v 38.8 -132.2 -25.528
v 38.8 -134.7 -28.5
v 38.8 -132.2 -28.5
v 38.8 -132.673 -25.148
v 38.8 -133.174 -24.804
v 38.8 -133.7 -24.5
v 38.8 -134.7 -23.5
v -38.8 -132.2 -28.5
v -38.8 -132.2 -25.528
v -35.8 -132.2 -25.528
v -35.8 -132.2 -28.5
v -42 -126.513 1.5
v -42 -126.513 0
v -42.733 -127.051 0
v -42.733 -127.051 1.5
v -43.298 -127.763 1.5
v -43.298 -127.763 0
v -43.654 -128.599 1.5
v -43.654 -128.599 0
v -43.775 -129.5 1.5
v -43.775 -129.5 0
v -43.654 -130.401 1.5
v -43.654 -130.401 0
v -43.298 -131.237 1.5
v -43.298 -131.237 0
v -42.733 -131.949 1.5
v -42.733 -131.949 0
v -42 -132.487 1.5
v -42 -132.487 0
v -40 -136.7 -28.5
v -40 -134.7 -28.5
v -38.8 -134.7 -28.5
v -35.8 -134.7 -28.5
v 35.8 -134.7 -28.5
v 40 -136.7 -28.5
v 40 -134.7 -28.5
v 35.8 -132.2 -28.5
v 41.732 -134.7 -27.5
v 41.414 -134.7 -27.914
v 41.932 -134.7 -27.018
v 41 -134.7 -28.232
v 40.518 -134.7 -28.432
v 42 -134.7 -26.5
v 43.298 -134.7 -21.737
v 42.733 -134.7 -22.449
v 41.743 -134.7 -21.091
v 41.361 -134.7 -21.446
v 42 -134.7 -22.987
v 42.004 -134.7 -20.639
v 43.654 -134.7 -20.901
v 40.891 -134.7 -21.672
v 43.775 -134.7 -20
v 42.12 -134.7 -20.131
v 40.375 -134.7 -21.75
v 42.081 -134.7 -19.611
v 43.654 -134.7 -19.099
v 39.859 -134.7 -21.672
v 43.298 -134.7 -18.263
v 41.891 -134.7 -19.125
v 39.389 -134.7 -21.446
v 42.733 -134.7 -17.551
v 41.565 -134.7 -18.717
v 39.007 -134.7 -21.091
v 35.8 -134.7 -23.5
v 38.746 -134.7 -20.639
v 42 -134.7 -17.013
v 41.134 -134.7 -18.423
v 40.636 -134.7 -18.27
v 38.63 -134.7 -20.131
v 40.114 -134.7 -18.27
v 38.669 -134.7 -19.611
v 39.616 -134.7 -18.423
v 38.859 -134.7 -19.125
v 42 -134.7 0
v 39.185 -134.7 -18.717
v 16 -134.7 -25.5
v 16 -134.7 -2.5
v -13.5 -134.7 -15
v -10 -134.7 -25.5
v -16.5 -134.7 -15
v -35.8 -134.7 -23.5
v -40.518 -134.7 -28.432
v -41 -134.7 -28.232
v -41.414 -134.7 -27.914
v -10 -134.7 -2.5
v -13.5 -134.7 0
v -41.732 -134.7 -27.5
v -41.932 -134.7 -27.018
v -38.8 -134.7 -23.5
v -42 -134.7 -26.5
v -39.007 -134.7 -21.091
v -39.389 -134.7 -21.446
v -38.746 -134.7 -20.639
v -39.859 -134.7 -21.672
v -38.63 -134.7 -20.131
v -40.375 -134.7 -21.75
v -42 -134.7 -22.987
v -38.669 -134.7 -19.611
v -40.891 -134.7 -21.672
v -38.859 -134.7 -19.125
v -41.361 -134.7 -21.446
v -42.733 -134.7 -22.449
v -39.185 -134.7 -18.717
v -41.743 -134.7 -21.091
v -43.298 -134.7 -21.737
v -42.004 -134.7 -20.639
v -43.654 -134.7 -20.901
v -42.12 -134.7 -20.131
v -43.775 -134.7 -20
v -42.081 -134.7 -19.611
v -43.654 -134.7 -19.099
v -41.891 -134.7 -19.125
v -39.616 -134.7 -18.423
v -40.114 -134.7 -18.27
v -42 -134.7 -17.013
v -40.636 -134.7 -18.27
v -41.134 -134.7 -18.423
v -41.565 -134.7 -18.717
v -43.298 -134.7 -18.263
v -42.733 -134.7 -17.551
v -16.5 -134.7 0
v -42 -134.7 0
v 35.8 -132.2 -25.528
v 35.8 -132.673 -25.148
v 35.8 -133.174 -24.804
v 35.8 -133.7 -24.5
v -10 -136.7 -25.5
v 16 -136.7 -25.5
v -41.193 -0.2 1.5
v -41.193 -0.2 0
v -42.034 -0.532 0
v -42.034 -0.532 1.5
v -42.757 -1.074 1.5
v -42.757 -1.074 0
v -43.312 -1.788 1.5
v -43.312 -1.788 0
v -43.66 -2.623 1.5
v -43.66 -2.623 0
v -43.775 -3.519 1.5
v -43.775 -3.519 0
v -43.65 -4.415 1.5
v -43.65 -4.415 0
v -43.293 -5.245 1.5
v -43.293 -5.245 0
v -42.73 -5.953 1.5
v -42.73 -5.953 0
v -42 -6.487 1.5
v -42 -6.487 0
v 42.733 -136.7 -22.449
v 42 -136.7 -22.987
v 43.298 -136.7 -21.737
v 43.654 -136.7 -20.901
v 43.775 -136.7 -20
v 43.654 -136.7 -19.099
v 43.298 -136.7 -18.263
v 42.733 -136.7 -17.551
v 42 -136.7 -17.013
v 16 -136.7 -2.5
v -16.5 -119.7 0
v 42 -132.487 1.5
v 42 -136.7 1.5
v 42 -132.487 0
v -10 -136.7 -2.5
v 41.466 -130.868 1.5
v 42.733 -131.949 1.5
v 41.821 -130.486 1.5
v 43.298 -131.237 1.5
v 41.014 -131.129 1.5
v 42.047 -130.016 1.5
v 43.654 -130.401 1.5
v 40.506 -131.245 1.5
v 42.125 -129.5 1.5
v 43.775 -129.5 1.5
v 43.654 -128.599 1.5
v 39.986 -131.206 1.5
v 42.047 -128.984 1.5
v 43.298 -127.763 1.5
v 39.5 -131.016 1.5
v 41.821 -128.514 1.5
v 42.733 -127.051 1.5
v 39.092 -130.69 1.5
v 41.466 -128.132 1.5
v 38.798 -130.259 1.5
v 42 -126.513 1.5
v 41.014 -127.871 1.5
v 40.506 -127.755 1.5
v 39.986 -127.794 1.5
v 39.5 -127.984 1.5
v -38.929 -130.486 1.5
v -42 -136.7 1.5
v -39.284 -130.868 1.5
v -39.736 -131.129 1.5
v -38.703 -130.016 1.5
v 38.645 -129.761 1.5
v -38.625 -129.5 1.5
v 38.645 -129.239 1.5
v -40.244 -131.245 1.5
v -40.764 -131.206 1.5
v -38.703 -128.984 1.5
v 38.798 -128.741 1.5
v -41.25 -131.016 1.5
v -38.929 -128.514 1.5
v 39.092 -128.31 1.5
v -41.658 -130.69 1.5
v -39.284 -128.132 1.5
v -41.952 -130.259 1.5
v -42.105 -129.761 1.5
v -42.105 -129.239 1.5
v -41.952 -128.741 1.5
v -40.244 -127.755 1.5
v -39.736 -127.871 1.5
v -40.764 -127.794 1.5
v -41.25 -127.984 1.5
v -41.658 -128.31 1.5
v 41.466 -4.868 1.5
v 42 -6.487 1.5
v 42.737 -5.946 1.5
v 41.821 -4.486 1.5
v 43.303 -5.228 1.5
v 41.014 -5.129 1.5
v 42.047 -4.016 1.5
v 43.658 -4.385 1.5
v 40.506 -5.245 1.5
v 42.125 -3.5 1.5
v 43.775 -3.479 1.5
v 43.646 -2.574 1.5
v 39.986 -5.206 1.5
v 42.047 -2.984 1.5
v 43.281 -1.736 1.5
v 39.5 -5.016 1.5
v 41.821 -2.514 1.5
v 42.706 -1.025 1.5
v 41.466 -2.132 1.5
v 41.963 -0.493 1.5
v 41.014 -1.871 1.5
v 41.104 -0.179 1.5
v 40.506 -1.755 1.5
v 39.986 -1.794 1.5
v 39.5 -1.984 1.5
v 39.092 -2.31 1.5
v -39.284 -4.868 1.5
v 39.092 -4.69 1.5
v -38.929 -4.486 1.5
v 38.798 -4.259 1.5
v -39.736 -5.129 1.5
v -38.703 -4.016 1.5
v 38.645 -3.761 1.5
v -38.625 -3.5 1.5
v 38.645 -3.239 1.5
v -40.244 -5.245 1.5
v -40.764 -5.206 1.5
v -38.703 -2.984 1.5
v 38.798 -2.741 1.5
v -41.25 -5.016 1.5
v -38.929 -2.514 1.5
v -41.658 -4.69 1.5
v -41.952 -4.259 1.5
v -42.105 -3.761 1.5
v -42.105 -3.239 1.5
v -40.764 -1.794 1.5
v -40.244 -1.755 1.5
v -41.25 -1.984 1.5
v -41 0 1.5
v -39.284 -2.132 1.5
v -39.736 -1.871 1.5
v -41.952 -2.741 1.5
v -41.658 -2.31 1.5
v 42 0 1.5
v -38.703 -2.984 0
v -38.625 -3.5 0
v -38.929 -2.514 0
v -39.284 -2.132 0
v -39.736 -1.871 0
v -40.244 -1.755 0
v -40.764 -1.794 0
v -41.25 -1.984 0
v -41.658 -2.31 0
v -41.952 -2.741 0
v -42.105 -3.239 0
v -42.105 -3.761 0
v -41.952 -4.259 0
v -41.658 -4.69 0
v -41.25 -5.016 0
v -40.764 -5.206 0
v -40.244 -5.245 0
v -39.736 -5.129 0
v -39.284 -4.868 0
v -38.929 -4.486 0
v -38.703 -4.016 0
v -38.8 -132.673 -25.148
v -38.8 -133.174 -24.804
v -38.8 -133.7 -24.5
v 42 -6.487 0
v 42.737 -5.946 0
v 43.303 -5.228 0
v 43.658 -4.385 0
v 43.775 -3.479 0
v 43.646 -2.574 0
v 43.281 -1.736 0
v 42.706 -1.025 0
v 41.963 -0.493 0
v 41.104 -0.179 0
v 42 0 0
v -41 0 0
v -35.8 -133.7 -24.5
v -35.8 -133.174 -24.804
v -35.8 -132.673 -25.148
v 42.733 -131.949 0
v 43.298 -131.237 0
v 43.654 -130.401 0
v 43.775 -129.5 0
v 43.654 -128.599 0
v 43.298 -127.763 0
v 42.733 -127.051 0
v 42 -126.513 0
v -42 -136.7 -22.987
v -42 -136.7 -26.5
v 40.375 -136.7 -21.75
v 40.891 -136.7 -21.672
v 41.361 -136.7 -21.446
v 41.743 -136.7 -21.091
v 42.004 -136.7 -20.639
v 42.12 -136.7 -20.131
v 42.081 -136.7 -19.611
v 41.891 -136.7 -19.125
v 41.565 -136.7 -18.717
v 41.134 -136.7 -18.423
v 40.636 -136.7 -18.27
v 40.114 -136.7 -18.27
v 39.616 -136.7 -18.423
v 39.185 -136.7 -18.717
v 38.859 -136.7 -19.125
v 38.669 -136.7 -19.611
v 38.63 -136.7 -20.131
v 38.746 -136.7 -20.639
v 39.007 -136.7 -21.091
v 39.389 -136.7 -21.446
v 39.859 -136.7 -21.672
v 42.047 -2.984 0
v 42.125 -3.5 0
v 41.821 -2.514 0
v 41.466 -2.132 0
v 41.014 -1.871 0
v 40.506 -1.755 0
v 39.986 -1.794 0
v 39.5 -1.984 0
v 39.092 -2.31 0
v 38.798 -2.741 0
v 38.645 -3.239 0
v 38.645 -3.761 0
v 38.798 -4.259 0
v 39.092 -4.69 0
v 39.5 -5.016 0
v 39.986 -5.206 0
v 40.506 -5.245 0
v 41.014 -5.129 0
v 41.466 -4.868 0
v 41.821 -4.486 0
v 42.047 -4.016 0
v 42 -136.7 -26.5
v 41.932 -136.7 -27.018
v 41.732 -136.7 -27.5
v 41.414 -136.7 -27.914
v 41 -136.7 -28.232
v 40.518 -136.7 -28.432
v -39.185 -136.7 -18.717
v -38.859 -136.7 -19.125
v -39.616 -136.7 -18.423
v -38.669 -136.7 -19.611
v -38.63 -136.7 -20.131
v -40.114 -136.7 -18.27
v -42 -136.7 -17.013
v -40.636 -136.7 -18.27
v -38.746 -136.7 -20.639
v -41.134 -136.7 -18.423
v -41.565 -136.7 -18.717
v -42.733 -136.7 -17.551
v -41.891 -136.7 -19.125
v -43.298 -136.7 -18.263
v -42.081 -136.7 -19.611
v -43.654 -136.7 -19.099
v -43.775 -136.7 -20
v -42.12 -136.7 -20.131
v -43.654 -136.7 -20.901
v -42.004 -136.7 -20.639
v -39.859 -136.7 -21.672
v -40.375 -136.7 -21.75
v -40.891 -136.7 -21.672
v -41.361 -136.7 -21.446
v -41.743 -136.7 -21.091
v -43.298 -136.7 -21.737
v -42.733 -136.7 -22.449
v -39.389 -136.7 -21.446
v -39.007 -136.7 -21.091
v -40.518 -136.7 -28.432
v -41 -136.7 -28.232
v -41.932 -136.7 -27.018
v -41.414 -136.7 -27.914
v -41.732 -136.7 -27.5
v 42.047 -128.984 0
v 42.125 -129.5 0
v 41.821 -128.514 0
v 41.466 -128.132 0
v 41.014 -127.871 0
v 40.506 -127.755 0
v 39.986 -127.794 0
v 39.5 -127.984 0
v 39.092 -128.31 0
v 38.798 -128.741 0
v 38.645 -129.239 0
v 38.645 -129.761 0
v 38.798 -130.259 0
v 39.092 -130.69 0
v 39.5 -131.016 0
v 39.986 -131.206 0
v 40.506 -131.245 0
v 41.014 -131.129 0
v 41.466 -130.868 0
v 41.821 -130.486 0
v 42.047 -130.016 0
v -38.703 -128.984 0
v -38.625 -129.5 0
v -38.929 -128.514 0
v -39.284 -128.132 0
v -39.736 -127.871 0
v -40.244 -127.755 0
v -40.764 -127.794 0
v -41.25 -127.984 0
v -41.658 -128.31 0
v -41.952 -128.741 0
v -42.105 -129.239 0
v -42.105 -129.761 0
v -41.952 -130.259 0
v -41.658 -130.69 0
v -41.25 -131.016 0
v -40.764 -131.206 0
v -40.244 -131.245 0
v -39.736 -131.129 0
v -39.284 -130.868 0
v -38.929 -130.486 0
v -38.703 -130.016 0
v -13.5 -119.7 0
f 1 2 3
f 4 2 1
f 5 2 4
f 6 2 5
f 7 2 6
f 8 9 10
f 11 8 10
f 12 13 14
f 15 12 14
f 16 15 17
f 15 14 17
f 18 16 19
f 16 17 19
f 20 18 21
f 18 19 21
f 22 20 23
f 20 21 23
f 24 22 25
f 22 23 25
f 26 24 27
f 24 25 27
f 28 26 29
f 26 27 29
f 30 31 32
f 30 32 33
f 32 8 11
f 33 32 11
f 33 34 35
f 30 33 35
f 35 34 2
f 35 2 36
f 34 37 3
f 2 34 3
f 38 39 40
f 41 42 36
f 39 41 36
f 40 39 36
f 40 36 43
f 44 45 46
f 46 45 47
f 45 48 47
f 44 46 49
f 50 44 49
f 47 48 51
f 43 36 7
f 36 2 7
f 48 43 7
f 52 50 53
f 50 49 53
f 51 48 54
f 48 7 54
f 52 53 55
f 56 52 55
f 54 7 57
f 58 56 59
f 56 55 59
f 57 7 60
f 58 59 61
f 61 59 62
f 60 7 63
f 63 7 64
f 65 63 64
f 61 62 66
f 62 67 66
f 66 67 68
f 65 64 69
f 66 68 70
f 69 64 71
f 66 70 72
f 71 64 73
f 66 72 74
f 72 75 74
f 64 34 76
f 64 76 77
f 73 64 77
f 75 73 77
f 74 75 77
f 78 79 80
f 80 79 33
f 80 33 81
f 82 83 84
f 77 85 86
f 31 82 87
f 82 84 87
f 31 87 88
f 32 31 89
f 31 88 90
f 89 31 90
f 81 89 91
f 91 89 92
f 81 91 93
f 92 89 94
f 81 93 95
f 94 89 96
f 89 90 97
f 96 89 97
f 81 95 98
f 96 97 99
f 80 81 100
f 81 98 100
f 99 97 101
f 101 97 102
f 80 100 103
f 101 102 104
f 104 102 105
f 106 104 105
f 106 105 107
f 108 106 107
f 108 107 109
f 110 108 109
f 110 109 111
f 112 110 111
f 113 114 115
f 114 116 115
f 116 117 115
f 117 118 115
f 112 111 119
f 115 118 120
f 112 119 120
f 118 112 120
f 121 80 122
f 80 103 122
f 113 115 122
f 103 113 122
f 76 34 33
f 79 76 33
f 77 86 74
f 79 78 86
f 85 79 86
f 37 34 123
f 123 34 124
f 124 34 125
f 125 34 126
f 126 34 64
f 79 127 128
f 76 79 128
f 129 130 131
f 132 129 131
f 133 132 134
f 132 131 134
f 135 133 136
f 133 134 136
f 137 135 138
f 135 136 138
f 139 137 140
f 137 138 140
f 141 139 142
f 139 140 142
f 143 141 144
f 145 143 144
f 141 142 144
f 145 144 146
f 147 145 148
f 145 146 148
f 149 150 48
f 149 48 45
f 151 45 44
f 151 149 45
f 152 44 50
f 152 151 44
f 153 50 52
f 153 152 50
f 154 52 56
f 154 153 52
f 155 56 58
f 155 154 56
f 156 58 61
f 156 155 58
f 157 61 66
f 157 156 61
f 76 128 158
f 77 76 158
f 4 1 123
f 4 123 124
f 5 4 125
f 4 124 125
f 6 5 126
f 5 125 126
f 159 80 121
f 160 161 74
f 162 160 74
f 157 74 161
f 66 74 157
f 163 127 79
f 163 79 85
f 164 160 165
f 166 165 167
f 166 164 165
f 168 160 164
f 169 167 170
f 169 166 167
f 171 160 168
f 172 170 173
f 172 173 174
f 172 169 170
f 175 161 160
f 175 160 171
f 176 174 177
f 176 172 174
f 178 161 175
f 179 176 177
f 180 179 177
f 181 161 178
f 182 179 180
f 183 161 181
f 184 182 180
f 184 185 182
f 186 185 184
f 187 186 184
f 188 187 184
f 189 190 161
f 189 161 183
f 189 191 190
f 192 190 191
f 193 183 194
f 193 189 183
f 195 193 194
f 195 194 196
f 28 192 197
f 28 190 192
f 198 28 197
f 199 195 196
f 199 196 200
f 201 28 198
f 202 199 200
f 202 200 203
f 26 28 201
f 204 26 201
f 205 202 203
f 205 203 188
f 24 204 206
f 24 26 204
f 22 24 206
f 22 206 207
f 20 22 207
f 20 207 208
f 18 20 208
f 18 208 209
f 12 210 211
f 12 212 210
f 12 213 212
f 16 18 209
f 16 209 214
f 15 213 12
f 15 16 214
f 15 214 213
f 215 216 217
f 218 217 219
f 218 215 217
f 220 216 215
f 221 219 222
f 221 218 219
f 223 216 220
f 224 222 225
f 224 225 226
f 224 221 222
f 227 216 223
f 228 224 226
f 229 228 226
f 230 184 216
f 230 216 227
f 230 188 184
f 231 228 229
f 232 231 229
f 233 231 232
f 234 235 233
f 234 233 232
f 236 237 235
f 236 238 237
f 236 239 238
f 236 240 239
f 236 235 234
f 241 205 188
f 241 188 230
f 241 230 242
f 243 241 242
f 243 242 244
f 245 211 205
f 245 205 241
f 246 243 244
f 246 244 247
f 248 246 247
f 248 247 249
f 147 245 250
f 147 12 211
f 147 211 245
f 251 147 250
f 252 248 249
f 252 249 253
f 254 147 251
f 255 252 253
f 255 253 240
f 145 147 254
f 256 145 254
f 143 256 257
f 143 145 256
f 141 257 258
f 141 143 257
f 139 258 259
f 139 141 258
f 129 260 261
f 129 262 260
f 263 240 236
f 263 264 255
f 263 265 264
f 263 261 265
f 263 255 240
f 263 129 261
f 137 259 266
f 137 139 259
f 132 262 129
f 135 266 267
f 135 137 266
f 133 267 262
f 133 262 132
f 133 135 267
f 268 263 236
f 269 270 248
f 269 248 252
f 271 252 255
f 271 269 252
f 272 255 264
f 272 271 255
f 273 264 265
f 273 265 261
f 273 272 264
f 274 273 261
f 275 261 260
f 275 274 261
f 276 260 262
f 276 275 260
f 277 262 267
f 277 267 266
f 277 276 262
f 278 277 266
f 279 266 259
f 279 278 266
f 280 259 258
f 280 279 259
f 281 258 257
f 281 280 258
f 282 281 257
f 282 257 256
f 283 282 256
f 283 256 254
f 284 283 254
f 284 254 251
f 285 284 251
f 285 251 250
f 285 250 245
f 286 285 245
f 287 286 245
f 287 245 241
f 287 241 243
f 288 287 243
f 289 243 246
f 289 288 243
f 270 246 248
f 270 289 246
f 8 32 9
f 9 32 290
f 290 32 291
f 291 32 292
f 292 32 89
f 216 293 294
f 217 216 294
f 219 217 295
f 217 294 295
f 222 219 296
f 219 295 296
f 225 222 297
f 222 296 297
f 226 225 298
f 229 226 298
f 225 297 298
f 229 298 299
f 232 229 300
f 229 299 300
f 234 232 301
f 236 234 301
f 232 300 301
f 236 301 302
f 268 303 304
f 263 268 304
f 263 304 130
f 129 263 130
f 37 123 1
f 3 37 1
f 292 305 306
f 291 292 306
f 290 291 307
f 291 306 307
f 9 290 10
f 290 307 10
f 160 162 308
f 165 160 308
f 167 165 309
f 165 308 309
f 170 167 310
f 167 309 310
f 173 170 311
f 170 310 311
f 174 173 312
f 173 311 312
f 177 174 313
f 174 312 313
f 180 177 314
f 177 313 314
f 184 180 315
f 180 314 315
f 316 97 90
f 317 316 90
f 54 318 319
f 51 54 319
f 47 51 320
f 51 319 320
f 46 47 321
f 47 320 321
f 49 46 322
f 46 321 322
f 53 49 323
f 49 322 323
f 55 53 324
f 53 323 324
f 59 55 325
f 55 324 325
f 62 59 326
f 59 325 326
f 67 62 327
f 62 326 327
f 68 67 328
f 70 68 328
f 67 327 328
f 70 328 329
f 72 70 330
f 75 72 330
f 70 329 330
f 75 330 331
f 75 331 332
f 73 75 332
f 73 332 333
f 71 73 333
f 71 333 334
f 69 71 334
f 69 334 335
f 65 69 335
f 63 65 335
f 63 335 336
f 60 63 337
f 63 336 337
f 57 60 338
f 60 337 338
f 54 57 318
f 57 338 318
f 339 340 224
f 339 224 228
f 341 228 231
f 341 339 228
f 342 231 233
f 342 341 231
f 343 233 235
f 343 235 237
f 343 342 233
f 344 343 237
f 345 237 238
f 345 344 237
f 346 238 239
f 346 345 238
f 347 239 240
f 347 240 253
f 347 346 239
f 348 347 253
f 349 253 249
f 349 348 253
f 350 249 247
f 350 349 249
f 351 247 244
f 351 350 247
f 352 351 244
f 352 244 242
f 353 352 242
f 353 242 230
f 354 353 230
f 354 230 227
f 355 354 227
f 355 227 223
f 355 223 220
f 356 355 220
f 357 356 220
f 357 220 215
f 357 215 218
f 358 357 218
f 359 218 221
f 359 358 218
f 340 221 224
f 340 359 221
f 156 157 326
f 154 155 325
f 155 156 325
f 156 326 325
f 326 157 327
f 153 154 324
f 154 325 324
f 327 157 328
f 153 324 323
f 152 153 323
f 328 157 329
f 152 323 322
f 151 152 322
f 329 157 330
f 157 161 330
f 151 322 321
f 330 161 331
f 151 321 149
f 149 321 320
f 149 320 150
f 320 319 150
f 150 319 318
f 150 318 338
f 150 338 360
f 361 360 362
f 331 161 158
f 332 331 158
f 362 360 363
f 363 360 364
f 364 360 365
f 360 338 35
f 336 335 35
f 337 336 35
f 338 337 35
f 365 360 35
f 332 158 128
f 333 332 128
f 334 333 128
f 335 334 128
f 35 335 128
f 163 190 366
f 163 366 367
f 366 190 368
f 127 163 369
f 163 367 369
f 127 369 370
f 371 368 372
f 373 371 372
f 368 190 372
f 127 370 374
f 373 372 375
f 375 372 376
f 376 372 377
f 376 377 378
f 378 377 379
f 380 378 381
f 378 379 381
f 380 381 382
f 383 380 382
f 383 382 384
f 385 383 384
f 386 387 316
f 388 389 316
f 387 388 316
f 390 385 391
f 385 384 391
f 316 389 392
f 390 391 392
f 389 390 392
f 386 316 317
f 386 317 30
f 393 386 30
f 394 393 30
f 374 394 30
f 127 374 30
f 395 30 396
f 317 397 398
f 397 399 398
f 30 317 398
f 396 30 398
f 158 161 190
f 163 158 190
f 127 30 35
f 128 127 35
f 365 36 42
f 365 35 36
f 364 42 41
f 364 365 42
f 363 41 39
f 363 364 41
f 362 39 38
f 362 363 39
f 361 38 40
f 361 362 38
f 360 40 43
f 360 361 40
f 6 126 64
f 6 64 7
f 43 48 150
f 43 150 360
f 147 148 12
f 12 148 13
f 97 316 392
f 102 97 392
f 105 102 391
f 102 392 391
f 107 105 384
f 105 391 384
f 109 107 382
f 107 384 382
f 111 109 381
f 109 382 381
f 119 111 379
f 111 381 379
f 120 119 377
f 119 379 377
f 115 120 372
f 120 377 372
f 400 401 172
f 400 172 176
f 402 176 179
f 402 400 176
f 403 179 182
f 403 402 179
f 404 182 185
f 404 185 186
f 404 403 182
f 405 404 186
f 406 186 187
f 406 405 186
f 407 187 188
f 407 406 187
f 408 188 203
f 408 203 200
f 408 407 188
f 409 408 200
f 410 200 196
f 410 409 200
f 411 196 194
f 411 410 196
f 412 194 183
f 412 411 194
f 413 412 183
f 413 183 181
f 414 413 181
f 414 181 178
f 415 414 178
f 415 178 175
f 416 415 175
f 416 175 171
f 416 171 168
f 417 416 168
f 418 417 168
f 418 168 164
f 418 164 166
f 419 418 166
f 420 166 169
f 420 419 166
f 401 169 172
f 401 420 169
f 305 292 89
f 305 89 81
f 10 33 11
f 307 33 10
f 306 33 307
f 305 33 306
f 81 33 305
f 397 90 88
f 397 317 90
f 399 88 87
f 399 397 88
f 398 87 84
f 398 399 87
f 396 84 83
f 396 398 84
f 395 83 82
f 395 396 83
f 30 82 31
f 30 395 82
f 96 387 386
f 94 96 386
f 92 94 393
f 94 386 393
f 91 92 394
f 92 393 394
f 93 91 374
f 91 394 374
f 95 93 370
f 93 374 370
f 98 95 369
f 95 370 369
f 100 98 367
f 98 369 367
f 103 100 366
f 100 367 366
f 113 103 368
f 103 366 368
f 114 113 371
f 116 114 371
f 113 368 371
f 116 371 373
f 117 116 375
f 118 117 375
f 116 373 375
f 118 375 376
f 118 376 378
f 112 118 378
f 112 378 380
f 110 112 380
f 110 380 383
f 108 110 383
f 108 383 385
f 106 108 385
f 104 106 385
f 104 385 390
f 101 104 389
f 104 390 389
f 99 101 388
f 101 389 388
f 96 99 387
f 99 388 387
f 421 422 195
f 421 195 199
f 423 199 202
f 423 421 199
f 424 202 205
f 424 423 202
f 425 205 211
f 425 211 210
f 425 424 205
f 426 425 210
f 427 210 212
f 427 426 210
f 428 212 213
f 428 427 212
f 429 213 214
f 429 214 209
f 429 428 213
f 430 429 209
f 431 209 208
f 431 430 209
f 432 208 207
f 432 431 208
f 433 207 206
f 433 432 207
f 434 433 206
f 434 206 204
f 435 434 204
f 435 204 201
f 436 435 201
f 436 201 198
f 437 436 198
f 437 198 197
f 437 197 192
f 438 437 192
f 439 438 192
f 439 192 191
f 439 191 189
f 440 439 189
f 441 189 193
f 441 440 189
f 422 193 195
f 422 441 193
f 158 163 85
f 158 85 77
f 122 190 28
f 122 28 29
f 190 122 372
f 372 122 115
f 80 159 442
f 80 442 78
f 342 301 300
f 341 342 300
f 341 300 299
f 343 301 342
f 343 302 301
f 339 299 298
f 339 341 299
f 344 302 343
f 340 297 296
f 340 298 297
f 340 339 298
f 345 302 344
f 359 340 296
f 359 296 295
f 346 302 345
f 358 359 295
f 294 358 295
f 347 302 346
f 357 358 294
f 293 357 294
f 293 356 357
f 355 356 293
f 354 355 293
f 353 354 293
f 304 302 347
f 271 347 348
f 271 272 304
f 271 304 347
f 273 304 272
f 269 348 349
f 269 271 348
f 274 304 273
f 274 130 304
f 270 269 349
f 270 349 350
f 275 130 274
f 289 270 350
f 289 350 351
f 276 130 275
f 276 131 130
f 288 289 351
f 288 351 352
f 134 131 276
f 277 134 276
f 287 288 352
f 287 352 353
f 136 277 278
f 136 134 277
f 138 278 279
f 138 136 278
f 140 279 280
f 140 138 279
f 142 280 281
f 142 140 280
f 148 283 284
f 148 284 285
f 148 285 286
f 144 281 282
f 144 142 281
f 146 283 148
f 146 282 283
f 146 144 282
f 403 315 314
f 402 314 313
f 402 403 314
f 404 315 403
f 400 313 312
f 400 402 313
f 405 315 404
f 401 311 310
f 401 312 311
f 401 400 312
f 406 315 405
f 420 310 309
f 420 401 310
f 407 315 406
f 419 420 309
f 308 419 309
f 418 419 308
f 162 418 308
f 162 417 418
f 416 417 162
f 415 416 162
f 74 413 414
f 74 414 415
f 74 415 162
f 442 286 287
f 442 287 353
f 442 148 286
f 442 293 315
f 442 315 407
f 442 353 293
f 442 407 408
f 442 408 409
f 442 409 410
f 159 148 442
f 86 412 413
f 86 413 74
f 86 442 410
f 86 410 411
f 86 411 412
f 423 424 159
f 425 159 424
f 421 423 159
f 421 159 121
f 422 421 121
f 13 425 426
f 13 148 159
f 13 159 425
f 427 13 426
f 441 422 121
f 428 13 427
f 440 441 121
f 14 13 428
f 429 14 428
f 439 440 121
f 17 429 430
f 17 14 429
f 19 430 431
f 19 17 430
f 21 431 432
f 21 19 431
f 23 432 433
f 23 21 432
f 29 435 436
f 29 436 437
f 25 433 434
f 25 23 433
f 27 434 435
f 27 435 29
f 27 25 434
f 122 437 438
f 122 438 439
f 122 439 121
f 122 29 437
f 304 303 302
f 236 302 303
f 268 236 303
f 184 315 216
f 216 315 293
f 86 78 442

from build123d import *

# Parameters (mm, degrees)
SKETCH1_R                = 1.75
BOSS_EXTRUDE1_DEPTH      = 1.5
BOSS_EXTRUDE2_DEPTH      = 84
BOSS_EXTRUDE3_DEPTH      = 1.5
BOSS_EXTRUDE3_DEPTH_BACK = 1.5
BOSS_EXTRUDE4_DEPTH      = 2
SKETCH5_R                = 1.75
CUT_EXTRUDE1_DEPTH       = 2
CUT_EXTRUDE2_DEPTH       = 150.007183132
CUT_EXTRUDE2_DEPTH_BACK  = 150.007183132
SKETCH6_W                = 84
SKETCH6_H                = 11.5
BOSS_EXTRUDE6_START      = -2
SKETCH7_W                = 3
SKETCH7_H                = 4
BOSS_EXTRUDE6_DEPTH      = 2.5
FILLET1_R                = 2
CHAMFER1_SIZE            = 1
FILLET2_R                = 8
SKETCH8_W                = 26
SKETCH8_H                = 23
CUT_EXTRUDE3_DEPTH       = 22.4262221


with BuildPart() as part:
    # Sketch1 → Boss-Extrude1 (new body)
    with BuildSketch(Plane.XY):
        with BuildLine():
            Line((-38.75, -134.5), (38.75, -134.5))
            Line((38.75, -134.5), (42, -134.5))
            Line((42, -134.5), (42, -132.48653227))
            ThreePointArc((42, -132.48653227), (43.775, -129.5), (42, -126.51346773))
            Line((42, -126.51346773), (42, -6.48653227))
            ThreePointArc((42, -6.48653227), (43.741212037, -3.021861398), (41.104087703, -0.179091823))
            Line((41.104087703, -0.179091823), (42, 0))
            Line((42, 0), (-41, 0))
            Line((-41, 0), (-41.193033114, -0.199875483))
            ThreePointArc((-41.193033114, -0.199875483), (-43.747330957, -3.067121364), (-42, -6.48653227))
            Line((-42, -6.48653227), (-42, -126.51346773))
            ThreePointArc((-42, -126.51346773), (-43.775, -129.5), (-42, -132.48653227))
            Line((-42, -132.48653227), (-42, -134.5))
            Line((-42, -134.5), (-38.75, -134.5))
        make_face()
        with Locations((-40.375, -129.5)):
            Circle(SKETCH1_R, mode=Mode.SUBTRACT)
        with Locations((40.375, -129.5)):
            Circle(SKETCH1_R, mode=Mode.SUBTRACT)
        with Locations((40.375, -3.5)):
            Circle(SKETCH1_R, mode=Mode.SUBTRACT)
        with Locations((-40.375, -3.5)):
            Circle(SKETCH1_R, mode=Mode.SUBTRACT)
    extrude(amount=BOSS_EXTRUDE1_DEPTH)

    # Sketch2 → Boss-Extrude2 (add)
    with BuildSketch(Plane.ZY.offset(42)):
        Polygon((1.5, -134.5), (1.5, -136.7), (-40, -136.7), (-40, -134.7), (0, -134.7), (0, -134.5), (0, -132.48653227), (1.5, -132.48653227), align=None)
    extrude(amount=-BOSS_EXTRUDE2_DEPTH)

    # Sketch3 → Boss-Extrude3 (add, two sides: drawn at the far end of the back side and taken through both)
    with BuildSketch(Plane(origin=(-15, 0, 0), x_dir=(0, 0, -1), z_dir=(1, 0, 0)).offset(-BOSS_EXTRUDE3_DEPTH_BACK)):
        Polygon((0, -119.7), (15, -134.7), (0, -134.7), align=None)
    extrude(amount=BOSS_EXTRUDE3_DEPTH + BOSS_EXTRUDE3_DEPTH_BACK)

    # Sketch4 → Boss-Extrude4 (add)
    with BuildSketch(Plane.XZ.offset(136.7)):
        with BuildLine():
            Line((-42, -17.01346773), (-42, -22.98653227))
            ThreePointArc((-42, -22.98653227), (-43.775, -20), (-42, -17.01346773))
        make_face()
        with BuildLine():
            Line((42, -17.01346773), (42, -22.98653227))
            ThreePointArc((42, -22.98653227), (43.775, -20), (42, -17.01346773))
        make_face()
    extrude(amount=-BOSS_EXTRUDE4_DEPTH)

    # Sketch5 → Cut-Extrude1 (cut)
    with BuildSketch(Plane.XZ.offset(136.7)):
        with Locations(Location((40.375, -20, 0), (0, 0, 270))):
            Circle(SKETCH5_R)
        with Locations(Location((-40.375, -20, 0), (0, 0, 270))):
            Circle(SKETCH5_R)
    extrude(amount=-CUT_EXTRUDE1_DEPTH, mode=Mode.SUBTRACT)

    # Sketch6 → Cut-Extrude2 (cut, two sides: drawn at the far end of the back side and taken through both)
    with BuildSketch(Plane.XZ.offset(136.7).offset(-CUT_EXTRUDE2_DEPTH_BACK)):
        with Locations((0, -34.25)):
            Rectangle(SKETCH6_W, SKETCH6_H)
    extrude(amount=CUT_EXTRUDE2_DEPTH + CUT_EXTRUDE2_DEPTH_BACK, mode=Mode.SUBTRACT)

    # Sketch7 → Boss-Extrude6 (add)
    with BuildSketch(Plane.XZ.offset(136.7).offset(BOSS_EXTRUDE6_START)):
        with Locations((-37.3, -26.5)):
            Rectangle(SKETCH7_W, SKETCH7_H)
        with Locations((37.3, -26.5)):
            Rectangle(SKETCH7_W, SKETCH7_H)
    extrude(amount=-BOSS_EXTRUDE6_DEPTH)

    # Fillet1
    fillet1_edges = [part.edges().sort_by_distance(p)[0] for p in [
        (42, -135.7, -28.5),
        (-42, -135.7, -28.5),
    ]]
    fillet(fillet1_edges, radius=FILLET1_R)

    # Chamfer1
    chamfer1_edges = [part.edges().sort_by_distance(p)[0] for p in [
        (-37.3, -134.7, -24.5),
        (-37.3, -132.2, -24.5),
        (37.3, -134.7, -24.5),
        (37.3, -132.2, -24.5),
    ]]
    chamfer(chamfer1_edges, length=CHAMFER1_SIZE)

    # Fillet2
    # the kernel refuses this fillet: 8 mm, written as the material it takes off along each edge
    with BuildSketch(Plane(origin=(-30.803909917, -133.2, -24.5), x_dir=(0, -1.0, -1.118394266079786e-11), z_dir=(-1, 0, 0))) as fillet2_piece_1:
        with BuildLine():
            CenterArc((4.243746579, -7.06996192), FILLET2_R, 117.902496562, 17.097503438)
            Line((-1.413107671, -1.413107671), (0, 0))
            Line((0, 0), (0.5, 0))
        make_face()
    extrude(amount=12.992180166, mode=Mode.SUBTRACT)
    with BuildSketch(Plane(origin=(30.803909917, -133.2, -24.5), x_dir=(0, 0.7071067811865501, -0.7071067811865448), z_dir=(1, 0, 0))) as fillet2_piece_2:
        with BuildLine():
            CenterArc((1.998436033, -8), FILLET2_R, 90, 17.097503438)
            Line((-0.353553391, -0.353553391), (0, 0))
            Line((0, 0), (1.998436033, 0))
        make_face()
    extrude(amount=12.992180166, mode=Mode.SUBTRACT)

    # Sketch8 → Cut-Extrude3 (cut)
    with BuildSketch(Plane.XZ.offset(136.7)):
        with Locations((3, -14)):
            Rectangle(SKETCH8_W, SKETCH8_H)
    extrude(amount=-CUT_EXTRUDE3_DEPTH, mode=Mode.SUBTRACT)


solid = part.part
